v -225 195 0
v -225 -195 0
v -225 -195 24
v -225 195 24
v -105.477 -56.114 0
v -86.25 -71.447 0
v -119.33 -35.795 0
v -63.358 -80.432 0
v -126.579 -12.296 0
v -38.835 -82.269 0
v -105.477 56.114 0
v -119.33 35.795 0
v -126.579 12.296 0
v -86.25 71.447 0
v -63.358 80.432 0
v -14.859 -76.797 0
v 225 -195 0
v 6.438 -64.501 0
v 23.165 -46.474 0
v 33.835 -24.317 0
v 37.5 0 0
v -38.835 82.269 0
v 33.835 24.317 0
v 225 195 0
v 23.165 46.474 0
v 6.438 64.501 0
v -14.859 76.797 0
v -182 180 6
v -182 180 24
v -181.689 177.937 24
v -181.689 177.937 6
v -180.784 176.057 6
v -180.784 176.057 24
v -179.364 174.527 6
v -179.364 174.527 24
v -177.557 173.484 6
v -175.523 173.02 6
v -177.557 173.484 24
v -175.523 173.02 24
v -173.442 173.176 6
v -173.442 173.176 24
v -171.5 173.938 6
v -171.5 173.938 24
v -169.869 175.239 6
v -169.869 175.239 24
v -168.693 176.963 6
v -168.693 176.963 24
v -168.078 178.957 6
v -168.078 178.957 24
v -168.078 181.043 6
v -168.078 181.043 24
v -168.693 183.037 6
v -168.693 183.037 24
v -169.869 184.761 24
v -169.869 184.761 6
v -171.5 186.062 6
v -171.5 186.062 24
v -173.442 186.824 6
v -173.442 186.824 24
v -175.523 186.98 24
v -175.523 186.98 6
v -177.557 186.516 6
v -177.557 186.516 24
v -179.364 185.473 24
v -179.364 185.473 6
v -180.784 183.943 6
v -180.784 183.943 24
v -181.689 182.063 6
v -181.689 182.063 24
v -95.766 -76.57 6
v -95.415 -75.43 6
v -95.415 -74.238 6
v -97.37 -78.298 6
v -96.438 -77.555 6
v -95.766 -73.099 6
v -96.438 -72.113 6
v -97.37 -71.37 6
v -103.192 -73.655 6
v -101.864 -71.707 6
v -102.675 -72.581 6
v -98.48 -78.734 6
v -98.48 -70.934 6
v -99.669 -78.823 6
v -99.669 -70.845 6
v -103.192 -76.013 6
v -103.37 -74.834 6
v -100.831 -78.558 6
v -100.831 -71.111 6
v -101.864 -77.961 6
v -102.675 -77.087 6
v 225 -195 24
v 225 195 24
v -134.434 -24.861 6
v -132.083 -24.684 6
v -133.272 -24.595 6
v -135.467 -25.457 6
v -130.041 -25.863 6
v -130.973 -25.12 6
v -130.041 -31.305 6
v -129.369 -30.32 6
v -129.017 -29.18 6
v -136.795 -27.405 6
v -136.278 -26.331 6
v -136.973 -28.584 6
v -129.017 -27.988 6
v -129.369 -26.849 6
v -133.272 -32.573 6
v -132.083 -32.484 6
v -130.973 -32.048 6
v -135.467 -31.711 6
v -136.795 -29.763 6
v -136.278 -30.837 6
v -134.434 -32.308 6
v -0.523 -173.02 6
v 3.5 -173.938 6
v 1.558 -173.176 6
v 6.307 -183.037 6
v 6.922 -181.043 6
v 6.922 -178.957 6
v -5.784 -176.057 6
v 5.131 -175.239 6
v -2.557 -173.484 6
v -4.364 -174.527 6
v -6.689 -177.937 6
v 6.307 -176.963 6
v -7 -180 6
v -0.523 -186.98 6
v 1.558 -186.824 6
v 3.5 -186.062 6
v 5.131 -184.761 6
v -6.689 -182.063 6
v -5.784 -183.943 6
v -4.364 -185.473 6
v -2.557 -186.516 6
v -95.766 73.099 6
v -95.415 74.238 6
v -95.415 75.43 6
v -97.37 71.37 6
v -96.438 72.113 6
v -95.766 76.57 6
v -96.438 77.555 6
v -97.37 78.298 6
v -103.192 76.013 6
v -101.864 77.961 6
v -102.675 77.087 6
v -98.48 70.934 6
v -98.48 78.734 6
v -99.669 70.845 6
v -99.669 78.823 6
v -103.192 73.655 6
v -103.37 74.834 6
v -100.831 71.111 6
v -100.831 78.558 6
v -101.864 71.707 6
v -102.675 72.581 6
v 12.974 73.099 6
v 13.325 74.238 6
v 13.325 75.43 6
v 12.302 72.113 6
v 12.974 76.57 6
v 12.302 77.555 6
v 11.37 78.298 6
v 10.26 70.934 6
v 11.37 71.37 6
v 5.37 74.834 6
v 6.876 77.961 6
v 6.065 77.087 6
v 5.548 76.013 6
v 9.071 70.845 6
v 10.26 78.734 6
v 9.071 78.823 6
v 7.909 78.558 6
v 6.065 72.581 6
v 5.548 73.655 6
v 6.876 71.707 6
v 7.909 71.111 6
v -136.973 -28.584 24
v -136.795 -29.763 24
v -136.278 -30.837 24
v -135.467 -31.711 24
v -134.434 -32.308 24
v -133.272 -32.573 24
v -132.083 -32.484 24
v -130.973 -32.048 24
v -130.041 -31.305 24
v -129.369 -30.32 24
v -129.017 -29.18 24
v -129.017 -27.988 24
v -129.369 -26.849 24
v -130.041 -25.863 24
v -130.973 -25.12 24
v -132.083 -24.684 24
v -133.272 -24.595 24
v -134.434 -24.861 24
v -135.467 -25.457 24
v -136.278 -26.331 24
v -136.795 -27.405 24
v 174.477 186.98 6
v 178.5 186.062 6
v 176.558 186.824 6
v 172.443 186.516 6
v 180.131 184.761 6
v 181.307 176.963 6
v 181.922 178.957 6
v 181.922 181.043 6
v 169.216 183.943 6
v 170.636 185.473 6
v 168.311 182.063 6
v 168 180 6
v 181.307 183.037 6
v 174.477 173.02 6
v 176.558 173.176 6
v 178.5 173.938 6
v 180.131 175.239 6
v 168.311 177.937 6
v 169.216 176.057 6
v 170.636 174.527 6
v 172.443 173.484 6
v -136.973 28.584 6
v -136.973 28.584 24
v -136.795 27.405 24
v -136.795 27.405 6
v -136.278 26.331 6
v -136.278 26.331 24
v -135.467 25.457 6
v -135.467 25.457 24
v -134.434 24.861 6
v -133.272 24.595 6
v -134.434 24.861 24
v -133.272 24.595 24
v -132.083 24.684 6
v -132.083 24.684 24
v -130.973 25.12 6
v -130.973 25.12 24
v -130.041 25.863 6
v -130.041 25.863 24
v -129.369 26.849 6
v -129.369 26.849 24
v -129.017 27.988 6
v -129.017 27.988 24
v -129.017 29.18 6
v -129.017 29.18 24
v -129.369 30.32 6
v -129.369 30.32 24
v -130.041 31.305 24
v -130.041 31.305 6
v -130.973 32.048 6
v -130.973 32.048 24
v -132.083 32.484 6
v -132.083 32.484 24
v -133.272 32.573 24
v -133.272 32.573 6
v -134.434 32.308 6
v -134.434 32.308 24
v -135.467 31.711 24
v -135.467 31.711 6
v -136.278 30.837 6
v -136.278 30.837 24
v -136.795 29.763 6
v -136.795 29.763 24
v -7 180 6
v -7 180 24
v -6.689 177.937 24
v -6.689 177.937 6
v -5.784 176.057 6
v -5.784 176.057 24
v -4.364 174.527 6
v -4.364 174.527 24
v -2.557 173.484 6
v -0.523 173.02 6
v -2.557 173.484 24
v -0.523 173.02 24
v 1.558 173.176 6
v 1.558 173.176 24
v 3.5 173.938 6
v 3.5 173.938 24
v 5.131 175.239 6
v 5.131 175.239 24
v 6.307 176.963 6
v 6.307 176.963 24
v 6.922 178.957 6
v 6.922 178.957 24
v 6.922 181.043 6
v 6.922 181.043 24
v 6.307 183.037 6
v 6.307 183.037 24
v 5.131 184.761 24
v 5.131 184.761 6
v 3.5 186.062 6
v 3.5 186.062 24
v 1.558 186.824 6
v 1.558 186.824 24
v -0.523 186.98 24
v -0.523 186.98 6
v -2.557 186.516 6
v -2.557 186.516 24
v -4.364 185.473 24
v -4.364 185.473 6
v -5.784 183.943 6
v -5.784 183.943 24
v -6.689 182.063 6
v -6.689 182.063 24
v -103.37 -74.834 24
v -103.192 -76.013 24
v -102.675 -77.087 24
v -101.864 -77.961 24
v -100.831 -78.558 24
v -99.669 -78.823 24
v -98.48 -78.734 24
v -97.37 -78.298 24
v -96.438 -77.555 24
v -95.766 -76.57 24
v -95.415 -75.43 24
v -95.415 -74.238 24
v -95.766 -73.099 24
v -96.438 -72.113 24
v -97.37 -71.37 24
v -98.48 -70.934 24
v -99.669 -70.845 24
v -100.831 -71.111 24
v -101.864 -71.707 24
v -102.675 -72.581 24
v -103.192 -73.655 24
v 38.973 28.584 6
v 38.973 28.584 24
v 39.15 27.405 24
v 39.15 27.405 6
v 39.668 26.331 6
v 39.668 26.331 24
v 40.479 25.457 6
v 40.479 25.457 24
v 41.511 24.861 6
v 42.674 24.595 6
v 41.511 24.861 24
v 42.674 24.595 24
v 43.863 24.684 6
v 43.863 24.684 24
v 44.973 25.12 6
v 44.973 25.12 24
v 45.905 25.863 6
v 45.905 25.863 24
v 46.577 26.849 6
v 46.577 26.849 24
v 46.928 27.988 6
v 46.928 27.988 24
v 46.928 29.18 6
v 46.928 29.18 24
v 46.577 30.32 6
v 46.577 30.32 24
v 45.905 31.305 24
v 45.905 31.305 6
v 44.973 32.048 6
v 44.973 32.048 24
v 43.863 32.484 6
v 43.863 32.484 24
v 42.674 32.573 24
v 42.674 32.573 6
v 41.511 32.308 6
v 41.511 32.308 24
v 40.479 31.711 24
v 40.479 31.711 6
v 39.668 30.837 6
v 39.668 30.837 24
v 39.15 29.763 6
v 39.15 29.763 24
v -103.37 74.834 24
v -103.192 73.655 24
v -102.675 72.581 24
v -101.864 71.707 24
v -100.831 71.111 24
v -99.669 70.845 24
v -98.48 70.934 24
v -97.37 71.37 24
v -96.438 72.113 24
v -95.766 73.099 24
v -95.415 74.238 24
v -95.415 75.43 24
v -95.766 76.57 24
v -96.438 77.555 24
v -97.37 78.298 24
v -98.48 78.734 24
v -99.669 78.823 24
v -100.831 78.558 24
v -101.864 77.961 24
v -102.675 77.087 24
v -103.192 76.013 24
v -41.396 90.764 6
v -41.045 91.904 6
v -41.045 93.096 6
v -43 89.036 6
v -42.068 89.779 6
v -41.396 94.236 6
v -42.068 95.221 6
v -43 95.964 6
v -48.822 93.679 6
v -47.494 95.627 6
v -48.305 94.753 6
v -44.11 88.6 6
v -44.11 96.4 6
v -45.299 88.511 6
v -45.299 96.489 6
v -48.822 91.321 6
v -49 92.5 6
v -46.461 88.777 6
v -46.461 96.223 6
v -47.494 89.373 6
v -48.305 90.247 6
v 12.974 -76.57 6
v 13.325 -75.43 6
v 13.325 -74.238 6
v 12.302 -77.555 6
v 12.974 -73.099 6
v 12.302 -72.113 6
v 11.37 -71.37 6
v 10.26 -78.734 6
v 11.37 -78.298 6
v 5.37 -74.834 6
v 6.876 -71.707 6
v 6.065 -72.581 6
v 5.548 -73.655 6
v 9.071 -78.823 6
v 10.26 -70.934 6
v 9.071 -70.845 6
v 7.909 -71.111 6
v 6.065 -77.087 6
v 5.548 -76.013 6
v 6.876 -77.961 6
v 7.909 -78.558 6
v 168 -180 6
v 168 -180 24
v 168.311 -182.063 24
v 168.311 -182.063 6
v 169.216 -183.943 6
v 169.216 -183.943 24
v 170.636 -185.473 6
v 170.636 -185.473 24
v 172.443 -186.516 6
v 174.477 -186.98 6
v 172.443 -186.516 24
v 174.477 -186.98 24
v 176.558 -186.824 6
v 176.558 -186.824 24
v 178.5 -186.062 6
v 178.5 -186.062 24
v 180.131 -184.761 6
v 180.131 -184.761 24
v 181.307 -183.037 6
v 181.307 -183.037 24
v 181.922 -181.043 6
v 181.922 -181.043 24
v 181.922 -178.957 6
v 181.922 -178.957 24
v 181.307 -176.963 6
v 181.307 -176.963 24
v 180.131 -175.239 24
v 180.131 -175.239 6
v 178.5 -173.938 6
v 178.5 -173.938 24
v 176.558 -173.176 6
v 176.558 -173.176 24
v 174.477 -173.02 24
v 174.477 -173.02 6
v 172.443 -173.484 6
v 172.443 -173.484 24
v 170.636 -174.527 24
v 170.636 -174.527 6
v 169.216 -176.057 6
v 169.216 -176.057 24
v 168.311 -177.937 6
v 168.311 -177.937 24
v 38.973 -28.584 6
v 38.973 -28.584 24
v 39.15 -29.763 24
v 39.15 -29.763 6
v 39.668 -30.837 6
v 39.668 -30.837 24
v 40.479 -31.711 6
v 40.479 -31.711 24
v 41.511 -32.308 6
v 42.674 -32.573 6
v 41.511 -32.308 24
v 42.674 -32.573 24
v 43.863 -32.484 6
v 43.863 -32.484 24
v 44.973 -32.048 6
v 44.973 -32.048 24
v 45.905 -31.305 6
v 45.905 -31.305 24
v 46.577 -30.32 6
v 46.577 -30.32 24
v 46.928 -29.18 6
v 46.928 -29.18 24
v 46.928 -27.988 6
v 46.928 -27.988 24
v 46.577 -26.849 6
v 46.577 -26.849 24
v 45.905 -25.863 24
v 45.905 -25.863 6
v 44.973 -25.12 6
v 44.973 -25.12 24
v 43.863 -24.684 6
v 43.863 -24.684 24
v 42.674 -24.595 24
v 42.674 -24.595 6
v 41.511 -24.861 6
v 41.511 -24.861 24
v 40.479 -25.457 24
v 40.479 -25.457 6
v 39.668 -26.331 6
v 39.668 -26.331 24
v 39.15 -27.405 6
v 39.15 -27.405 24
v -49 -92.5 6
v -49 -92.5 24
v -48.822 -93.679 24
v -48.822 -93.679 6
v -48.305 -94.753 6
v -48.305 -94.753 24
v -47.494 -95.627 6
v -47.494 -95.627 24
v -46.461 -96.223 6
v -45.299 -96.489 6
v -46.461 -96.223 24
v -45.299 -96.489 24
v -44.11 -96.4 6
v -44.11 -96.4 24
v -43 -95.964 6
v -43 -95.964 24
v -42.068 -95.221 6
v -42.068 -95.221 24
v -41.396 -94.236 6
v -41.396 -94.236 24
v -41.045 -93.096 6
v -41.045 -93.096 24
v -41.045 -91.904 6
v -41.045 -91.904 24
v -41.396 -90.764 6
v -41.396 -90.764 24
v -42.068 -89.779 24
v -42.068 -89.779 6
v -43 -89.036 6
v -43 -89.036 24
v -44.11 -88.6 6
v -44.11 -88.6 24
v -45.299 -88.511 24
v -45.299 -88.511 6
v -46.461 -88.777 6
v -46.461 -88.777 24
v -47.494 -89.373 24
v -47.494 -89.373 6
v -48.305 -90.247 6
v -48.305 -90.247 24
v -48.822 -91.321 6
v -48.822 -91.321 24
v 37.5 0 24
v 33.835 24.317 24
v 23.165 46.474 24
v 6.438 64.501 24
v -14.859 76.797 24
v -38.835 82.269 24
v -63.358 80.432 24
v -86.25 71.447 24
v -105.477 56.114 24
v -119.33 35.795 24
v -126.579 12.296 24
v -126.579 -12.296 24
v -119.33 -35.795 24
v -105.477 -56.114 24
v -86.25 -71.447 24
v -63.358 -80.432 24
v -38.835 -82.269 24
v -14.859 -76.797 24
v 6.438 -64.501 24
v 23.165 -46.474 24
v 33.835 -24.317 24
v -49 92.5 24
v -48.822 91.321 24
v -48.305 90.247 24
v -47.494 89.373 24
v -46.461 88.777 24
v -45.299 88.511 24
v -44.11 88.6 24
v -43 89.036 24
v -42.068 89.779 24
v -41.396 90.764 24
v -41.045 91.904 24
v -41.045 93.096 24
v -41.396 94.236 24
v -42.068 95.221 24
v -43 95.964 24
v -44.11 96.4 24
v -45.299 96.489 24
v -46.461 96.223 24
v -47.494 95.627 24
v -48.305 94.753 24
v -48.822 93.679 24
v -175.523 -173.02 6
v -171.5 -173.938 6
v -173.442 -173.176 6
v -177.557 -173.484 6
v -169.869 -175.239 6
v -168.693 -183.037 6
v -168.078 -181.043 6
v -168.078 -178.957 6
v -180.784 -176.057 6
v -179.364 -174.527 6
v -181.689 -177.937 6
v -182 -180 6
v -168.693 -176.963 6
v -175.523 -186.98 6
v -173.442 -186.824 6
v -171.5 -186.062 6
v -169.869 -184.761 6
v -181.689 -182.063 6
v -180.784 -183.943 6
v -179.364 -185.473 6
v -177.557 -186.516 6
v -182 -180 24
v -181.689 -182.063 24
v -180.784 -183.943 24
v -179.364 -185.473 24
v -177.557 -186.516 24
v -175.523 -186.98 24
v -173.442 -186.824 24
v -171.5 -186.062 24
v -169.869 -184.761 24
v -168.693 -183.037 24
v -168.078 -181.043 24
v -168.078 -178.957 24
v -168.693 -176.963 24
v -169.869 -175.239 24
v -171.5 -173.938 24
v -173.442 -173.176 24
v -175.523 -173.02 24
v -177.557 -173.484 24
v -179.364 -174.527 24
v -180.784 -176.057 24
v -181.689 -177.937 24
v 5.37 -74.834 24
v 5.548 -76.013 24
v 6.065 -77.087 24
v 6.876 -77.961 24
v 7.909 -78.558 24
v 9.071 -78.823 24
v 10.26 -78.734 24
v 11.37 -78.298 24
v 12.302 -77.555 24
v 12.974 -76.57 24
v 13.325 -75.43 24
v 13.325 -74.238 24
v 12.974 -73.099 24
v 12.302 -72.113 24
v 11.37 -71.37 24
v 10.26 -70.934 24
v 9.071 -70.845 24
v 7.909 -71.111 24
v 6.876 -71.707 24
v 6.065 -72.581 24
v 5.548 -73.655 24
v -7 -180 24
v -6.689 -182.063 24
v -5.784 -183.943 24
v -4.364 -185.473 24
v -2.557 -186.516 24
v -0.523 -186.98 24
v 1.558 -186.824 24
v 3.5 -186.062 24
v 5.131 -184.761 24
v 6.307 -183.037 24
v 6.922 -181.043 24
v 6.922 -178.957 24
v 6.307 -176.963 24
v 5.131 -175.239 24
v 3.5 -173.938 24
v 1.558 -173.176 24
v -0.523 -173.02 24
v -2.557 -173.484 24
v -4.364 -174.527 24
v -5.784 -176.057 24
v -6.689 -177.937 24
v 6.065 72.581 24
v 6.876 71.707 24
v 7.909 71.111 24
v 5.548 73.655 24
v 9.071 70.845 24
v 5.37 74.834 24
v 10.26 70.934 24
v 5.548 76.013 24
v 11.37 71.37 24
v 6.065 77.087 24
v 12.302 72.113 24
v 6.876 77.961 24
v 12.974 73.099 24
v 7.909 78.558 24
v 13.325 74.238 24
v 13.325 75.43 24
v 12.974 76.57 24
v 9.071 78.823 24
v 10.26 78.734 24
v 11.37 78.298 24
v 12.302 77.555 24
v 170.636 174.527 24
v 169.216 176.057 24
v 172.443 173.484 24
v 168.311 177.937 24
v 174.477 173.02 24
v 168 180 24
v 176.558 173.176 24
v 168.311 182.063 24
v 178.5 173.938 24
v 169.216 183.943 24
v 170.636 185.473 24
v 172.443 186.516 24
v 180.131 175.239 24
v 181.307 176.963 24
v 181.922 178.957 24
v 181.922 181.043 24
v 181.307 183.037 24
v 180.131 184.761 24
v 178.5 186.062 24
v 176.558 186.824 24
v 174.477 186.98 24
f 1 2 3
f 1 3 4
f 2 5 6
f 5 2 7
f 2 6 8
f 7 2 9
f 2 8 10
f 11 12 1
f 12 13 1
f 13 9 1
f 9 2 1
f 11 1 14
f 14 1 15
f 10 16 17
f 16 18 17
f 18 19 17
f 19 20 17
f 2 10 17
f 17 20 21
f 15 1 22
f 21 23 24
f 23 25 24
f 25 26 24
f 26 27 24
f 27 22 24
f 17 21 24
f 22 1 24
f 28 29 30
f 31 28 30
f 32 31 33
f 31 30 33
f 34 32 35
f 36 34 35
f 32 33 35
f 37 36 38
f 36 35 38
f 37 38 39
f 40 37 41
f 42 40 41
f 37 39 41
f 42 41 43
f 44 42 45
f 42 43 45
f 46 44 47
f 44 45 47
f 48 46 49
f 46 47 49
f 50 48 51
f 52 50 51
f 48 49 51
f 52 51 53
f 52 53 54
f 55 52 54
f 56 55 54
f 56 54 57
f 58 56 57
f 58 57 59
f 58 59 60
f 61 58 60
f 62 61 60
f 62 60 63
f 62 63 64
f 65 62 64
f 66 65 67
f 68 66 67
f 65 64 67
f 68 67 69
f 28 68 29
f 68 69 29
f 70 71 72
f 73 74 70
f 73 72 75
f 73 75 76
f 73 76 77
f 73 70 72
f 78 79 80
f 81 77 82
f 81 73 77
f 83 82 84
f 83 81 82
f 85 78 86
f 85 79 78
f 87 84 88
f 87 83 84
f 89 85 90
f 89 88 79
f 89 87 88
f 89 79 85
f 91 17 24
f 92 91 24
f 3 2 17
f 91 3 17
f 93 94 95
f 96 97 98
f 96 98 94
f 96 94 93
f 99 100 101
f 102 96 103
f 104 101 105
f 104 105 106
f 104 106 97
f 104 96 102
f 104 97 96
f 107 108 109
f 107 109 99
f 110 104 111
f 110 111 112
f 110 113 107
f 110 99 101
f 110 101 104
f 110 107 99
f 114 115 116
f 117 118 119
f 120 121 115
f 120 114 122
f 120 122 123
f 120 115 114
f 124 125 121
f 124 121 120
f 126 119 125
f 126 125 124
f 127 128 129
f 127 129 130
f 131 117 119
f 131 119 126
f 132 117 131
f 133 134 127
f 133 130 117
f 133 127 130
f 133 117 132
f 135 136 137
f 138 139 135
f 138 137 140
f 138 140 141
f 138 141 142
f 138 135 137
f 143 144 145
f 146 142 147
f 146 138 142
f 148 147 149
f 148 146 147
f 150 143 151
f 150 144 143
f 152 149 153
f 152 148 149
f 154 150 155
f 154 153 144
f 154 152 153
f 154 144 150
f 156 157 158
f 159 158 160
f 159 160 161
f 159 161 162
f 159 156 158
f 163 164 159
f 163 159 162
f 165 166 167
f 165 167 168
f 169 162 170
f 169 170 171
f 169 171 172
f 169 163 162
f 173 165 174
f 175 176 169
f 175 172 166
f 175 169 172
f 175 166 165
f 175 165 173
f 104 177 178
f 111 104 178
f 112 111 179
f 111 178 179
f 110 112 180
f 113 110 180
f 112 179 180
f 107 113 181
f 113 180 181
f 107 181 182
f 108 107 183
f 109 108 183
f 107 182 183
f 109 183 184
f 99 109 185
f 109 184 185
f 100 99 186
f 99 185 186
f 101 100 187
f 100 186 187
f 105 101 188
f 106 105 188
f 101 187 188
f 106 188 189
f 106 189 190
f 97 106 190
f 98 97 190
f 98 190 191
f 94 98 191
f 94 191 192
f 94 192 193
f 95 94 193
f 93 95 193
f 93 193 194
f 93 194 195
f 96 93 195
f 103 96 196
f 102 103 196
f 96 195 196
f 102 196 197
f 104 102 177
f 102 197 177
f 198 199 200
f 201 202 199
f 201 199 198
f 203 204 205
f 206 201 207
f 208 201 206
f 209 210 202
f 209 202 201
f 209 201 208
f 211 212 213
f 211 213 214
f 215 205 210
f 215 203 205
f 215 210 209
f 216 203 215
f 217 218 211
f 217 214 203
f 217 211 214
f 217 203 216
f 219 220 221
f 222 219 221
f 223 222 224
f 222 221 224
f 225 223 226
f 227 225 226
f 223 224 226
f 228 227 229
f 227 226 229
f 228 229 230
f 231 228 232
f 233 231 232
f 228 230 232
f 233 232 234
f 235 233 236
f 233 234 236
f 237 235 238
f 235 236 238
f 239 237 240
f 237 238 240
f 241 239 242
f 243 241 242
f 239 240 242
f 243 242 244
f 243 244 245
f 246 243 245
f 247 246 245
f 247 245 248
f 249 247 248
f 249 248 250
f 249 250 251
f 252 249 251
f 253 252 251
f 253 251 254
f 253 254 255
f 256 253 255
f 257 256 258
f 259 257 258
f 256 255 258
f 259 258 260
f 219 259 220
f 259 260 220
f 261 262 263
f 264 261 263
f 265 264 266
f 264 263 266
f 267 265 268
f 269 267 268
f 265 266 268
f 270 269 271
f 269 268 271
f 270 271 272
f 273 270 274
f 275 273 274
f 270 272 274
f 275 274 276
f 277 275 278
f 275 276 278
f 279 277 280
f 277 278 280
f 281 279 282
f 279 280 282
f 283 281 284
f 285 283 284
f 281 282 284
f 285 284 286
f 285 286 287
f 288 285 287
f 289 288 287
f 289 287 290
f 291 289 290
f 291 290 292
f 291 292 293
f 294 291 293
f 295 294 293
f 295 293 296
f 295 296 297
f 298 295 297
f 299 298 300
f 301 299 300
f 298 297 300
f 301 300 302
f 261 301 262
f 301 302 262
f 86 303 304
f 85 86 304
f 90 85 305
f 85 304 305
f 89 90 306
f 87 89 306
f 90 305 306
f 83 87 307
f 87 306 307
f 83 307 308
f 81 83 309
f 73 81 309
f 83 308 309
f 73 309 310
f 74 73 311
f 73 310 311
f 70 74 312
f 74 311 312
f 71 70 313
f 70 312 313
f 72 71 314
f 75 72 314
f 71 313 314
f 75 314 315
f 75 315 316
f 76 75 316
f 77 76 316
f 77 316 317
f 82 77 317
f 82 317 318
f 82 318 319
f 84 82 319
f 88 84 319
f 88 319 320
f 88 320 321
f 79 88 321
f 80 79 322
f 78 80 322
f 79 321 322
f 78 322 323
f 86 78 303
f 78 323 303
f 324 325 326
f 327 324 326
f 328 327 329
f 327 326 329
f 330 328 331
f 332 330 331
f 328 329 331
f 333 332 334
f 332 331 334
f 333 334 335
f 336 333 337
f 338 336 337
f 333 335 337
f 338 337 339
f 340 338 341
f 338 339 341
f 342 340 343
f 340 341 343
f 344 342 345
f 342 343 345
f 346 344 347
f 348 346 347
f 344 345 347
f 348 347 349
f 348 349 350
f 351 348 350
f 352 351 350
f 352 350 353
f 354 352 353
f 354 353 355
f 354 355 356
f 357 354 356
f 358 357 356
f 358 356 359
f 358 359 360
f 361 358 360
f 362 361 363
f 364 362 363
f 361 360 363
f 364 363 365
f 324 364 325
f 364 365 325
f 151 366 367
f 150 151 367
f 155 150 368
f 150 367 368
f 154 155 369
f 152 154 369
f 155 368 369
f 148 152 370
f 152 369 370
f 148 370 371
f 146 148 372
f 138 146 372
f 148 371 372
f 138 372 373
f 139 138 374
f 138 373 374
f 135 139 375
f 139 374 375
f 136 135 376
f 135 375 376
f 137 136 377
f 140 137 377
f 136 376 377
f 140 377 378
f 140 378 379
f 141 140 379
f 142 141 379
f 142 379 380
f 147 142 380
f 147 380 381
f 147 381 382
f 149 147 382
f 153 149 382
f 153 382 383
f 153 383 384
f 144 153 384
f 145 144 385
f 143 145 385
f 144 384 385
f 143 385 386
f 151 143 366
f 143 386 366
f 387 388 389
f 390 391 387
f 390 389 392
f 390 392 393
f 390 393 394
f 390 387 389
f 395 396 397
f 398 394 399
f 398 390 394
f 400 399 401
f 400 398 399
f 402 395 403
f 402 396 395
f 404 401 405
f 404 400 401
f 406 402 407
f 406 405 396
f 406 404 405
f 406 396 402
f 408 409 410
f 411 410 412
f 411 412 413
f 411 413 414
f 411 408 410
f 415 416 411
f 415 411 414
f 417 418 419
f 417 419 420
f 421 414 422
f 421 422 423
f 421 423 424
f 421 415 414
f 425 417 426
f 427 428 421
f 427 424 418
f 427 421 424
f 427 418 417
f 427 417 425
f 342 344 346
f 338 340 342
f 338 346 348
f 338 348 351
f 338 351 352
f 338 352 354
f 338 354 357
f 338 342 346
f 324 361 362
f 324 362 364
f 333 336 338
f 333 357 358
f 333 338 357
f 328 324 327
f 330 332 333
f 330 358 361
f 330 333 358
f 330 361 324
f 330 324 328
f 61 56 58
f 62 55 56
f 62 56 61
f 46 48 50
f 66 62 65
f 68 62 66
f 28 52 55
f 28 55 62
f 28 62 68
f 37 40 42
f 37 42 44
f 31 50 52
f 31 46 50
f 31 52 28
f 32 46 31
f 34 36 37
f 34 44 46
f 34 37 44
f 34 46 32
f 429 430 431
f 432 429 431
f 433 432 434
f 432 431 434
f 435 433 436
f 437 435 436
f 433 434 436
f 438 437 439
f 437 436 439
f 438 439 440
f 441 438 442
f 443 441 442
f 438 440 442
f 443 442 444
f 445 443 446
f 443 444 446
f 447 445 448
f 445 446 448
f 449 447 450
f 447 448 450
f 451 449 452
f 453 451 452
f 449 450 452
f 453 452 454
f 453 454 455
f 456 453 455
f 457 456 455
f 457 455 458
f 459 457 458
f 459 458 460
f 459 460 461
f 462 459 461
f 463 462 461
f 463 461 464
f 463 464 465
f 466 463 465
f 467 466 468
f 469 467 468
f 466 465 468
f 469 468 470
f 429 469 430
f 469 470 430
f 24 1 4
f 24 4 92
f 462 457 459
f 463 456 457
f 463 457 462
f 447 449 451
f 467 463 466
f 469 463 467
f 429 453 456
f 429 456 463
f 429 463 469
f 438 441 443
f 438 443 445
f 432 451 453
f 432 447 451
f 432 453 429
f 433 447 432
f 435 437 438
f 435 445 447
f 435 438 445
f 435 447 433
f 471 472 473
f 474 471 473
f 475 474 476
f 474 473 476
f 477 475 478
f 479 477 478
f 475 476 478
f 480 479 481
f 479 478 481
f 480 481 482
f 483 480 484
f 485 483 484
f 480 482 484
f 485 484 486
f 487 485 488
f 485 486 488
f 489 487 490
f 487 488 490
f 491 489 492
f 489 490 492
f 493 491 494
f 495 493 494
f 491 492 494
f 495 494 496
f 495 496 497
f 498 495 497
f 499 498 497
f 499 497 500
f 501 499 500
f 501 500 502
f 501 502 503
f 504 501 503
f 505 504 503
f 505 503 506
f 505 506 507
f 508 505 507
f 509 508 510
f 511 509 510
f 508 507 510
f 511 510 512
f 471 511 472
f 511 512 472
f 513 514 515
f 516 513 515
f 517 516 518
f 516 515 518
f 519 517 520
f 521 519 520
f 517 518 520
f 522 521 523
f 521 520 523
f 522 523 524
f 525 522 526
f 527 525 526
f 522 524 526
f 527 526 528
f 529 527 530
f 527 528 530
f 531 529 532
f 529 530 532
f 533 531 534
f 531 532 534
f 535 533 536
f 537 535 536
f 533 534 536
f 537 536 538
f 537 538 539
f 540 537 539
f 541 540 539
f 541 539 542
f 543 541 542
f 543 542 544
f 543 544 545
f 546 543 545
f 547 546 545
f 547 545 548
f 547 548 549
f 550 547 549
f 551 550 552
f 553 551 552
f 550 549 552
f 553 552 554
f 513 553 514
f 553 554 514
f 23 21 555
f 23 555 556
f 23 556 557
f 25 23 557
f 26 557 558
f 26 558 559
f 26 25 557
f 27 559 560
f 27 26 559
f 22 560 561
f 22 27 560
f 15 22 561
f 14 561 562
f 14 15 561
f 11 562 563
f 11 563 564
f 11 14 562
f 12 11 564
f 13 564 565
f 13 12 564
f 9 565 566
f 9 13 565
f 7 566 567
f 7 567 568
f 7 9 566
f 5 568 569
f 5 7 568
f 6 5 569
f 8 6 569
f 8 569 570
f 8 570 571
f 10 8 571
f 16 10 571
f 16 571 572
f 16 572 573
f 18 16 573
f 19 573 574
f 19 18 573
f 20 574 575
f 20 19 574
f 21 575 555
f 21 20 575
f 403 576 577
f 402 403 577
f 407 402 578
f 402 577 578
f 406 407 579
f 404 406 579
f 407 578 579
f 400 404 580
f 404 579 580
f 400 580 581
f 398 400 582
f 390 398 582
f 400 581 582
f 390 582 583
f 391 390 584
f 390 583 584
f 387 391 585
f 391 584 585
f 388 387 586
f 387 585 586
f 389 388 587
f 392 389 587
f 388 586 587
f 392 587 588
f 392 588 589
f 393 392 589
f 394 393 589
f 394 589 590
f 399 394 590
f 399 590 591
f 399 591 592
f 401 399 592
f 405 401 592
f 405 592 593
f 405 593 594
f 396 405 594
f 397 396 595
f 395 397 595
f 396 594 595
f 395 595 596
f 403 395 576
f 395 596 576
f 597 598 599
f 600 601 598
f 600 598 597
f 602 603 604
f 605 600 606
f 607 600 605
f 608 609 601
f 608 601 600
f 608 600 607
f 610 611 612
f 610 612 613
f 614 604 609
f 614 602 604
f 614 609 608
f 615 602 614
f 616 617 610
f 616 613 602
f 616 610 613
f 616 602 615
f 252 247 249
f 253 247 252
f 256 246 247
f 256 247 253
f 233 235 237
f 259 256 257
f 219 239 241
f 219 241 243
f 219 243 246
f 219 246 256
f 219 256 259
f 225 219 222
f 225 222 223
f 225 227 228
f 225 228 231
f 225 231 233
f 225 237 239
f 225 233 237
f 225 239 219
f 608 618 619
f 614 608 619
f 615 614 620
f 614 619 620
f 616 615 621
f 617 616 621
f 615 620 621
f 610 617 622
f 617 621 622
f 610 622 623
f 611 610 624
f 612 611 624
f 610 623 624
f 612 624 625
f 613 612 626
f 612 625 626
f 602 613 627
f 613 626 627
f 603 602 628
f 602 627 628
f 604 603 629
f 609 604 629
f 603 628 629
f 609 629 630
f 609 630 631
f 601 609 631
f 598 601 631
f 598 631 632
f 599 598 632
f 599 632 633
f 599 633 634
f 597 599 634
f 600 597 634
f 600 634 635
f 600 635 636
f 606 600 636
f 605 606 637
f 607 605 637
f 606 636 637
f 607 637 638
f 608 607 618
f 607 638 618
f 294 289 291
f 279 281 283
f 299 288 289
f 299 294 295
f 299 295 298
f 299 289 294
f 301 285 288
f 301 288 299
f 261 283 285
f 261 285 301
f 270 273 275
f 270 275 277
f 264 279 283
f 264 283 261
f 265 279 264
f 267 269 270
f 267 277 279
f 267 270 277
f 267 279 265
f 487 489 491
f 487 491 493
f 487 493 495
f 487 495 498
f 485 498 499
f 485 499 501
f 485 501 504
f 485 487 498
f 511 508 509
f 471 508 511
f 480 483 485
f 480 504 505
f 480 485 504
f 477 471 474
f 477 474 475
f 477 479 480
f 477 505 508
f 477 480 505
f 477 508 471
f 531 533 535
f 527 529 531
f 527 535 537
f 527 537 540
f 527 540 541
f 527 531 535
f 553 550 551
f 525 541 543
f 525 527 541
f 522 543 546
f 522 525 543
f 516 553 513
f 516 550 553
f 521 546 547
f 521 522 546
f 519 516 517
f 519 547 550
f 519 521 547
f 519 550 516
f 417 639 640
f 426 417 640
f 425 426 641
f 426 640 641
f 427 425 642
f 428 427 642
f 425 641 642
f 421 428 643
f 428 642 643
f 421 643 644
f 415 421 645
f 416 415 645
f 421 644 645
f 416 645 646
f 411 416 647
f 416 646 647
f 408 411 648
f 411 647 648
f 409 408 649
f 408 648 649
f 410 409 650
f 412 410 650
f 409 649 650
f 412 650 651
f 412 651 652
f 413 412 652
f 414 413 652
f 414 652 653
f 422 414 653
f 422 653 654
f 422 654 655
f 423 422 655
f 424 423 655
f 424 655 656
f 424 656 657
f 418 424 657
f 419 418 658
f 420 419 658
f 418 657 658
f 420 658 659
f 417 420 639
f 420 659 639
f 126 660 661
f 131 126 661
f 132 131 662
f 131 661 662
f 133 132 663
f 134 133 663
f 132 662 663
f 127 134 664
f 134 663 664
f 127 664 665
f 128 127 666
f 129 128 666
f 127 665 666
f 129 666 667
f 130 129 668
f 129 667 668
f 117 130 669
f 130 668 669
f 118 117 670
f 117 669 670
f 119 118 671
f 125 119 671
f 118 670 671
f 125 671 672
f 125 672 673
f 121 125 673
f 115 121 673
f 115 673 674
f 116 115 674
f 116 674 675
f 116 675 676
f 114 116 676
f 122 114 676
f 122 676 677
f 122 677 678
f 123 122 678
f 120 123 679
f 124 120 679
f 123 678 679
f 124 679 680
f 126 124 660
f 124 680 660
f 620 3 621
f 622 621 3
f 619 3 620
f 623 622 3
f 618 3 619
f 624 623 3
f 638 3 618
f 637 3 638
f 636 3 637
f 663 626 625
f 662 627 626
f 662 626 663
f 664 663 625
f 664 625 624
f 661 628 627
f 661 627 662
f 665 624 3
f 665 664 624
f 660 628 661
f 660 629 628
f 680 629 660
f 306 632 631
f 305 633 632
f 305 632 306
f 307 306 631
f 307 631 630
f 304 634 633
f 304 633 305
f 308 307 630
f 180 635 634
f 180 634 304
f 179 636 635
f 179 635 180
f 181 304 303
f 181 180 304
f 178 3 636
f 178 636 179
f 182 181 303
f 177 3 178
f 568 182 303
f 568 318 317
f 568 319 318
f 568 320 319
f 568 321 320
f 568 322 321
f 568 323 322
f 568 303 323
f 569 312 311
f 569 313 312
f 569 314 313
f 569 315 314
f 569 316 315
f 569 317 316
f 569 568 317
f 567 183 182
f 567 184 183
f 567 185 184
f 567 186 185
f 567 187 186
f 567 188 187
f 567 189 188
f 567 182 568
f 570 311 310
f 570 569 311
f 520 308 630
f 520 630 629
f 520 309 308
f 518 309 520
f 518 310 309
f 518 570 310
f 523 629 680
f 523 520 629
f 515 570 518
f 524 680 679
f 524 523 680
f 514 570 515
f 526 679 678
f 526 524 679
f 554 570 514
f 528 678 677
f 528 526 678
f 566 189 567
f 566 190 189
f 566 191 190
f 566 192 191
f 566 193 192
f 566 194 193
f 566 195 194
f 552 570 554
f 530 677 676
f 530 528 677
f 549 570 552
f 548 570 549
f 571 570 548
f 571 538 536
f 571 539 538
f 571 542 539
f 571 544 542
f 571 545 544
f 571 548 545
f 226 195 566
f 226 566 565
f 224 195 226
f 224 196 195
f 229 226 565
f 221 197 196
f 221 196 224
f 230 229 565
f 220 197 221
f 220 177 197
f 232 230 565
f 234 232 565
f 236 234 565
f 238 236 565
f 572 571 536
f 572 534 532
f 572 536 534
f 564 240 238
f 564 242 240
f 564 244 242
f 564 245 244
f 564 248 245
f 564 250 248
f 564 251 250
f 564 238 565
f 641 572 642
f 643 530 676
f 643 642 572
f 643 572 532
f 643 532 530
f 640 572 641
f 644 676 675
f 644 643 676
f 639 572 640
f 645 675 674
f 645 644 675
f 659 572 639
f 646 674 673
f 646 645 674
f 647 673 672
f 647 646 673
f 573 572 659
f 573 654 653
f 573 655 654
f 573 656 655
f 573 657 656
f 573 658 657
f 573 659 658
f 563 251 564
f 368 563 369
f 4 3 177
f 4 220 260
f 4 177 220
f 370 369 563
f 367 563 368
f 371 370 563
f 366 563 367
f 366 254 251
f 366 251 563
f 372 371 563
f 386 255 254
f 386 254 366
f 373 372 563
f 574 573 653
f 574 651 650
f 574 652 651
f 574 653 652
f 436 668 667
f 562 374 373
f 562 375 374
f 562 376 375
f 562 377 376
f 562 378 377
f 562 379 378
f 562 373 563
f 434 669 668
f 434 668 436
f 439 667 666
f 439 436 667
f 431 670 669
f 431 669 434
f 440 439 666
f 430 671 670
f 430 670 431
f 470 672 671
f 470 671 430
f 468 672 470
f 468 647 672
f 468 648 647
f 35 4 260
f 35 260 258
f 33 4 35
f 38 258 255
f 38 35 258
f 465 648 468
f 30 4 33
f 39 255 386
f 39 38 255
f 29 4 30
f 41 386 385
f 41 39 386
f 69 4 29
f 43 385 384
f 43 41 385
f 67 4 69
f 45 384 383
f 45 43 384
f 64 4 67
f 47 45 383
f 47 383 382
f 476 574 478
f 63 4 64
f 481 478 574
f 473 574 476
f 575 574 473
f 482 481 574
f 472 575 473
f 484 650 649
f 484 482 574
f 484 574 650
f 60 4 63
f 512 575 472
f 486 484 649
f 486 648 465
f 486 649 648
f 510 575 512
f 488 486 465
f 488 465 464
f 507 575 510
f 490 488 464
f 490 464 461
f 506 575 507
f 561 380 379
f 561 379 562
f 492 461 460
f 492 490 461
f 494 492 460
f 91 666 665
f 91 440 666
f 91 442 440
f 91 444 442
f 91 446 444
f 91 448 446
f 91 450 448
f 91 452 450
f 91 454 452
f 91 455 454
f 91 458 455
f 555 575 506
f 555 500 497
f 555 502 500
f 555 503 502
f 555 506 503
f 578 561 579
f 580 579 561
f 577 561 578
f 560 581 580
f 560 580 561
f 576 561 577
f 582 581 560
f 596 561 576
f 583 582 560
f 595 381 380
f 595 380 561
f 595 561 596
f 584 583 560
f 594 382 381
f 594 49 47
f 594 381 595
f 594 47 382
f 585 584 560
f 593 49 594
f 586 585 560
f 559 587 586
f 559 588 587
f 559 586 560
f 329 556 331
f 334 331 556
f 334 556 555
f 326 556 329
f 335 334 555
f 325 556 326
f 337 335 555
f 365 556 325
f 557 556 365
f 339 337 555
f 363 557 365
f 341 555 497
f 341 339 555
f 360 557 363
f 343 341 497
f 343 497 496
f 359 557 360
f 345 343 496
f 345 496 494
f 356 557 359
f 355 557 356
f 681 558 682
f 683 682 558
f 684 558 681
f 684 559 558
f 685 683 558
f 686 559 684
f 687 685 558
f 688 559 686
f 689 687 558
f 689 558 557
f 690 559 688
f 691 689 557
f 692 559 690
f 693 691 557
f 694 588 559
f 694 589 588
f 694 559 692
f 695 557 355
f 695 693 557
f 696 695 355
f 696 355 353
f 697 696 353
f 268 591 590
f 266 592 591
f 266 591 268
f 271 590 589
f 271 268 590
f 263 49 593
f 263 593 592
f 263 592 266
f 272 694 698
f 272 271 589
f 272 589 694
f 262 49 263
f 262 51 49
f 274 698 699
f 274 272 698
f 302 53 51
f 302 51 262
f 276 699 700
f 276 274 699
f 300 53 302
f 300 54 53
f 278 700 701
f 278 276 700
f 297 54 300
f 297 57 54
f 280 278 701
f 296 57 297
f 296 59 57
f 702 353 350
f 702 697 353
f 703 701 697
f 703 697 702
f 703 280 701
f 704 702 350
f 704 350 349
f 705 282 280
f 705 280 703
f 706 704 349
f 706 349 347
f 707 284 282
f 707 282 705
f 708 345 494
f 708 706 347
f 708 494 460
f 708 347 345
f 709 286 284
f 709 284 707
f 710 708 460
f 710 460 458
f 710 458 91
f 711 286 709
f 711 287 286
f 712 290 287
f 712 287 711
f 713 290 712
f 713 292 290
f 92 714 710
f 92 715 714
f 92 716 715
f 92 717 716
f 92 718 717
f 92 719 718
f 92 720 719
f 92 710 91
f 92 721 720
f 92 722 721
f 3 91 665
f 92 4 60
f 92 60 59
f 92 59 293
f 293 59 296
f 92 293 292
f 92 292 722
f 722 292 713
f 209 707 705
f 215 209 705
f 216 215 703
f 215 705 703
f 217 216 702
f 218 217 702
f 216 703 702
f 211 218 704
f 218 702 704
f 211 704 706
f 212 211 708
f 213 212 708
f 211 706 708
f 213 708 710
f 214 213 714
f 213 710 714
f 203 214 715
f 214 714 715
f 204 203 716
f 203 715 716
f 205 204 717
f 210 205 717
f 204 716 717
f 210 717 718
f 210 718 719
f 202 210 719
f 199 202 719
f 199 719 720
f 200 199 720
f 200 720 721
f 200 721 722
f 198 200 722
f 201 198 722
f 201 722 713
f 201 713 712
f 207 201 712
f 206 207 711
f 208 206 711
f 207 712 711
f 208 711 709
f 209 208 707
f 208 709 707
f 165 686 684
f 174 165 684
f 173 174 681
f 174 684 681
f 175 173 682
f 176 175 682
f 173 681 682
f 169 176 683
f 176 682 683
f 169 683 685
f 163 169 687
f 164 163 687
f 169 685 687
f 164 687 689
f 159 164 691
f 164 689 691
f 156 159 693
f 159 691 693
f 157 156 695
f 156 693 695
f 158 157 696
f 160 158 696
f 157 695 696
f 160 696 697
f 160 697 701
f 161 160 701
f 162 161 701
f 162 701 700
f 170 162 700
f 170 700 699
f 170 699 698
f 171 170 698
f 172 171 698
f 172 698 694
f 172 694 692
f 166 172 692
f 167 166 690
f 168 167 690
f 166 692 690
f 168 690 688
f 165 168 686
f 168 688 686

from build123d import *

# Parameters (mm, degrees)
SKETCH_1_W          = 450
SKETCH_1_H          = 390
SKETCH_1_R          = 82.5
EXTRUDE_1_DEPTH     = 24
CUT_EXTRUDE_START   = 24
SKETCH_1_3_R        = 4
SKETCH_1_3_R_2      = 7
CUT_EXTRUDE_1_DEPTH = 18


with BuildPart() as part:
    # 草图1 → 凸台-拉伸1 (new body)
    with BuildSketch(Plane.XY):
        Rectangle(SKETCH_1_W, SKETCH_1_H)
        with Locations((-45, 0)):
            Circle(SKETCH_1_R, mode=Mode.SUBTRACT)
    extrude(amount=EXTRUDE_1_DEPTH)

    # 草图1<3> → 切除-拉伸1 (cut)
    with BuildSketch(Plane.XY.offset(CUT_EXTRUDE_START)):
        with Locations(Location((-45, 92.5, 0), (0, 0, 180))):
            Circle(SKETCH_1_3_R)
        with Locations(Location((9.370135837, 74.83407198, 0), (0, 0, 180))):
            Circle(SKETCH_1_3_R)
        with Locations(Location((42.972727757, 28.58407198, 0), (0, 0, 180))):
            Circle(SKETCH_1_3_R)
        with Locations(Location((42.972727757, -28.58407198, 0), (0, 0, 180))):
            Circle(SKETCH_1_3_R)
        with Locations(Location((9.370135837, -74.83407198, 0), (0, 0, 180))):
            Circle(SKETCH_1_3_R)
        with Locations(Location((-45, -92.5, 0), (0, 0, 180))):
            Circle(SKETCH_1_3_R)
        with Locations(Location((-99.370135837, -74.83407198, 0), (0, 0, 180))):
            Circle(SKETCH_1_3_R)
        with Locations(Location((-132.972727757, -28.58407198, 0), (0, 0, 180))):
            Circle(SKETCH_1_3_R)
        with Locations(Location((-132.972727757, 28.58407198, 0), (0, 0, 180))):
            Circle(SKETCH_1_3_R)
        with Locations(Location((-99.370135837, 74.83407198, 0), (0, 0, 180))):
            Circle(SKETCH_1_3_R)
        with Locations(Location((0, 180, 0), (0, 0, 180))):
            Circle(SKETCH_1_3_R_2)
        with Locations(Location((-175, 180, 0), (0, 0, 180))):
            Circle(SKETCH_1_3_R_2)
        with Locations(Location((175, 180, 0), (0, 0, 180))):
            Circle(SKETCH_1_3_R_2)
        with Locations(Location((-175, -180, 0), (0, 0, 180))):
            Circle(SKETCH_1_3_R_2)
        with Locations(Location((0, -180, 0), (0, 0, 180))):
            Circle(SKETCH_1_3_R_2)
        with Locations(Location((175, -180, 0), (0, 0, 180))):
            Circle(SKETCH_1_3_R_2)
    extrude(amount=-CUT_EXTRUDE_1_DEPTH, mode=Mode.SUBTRACT)


solid = part.part
